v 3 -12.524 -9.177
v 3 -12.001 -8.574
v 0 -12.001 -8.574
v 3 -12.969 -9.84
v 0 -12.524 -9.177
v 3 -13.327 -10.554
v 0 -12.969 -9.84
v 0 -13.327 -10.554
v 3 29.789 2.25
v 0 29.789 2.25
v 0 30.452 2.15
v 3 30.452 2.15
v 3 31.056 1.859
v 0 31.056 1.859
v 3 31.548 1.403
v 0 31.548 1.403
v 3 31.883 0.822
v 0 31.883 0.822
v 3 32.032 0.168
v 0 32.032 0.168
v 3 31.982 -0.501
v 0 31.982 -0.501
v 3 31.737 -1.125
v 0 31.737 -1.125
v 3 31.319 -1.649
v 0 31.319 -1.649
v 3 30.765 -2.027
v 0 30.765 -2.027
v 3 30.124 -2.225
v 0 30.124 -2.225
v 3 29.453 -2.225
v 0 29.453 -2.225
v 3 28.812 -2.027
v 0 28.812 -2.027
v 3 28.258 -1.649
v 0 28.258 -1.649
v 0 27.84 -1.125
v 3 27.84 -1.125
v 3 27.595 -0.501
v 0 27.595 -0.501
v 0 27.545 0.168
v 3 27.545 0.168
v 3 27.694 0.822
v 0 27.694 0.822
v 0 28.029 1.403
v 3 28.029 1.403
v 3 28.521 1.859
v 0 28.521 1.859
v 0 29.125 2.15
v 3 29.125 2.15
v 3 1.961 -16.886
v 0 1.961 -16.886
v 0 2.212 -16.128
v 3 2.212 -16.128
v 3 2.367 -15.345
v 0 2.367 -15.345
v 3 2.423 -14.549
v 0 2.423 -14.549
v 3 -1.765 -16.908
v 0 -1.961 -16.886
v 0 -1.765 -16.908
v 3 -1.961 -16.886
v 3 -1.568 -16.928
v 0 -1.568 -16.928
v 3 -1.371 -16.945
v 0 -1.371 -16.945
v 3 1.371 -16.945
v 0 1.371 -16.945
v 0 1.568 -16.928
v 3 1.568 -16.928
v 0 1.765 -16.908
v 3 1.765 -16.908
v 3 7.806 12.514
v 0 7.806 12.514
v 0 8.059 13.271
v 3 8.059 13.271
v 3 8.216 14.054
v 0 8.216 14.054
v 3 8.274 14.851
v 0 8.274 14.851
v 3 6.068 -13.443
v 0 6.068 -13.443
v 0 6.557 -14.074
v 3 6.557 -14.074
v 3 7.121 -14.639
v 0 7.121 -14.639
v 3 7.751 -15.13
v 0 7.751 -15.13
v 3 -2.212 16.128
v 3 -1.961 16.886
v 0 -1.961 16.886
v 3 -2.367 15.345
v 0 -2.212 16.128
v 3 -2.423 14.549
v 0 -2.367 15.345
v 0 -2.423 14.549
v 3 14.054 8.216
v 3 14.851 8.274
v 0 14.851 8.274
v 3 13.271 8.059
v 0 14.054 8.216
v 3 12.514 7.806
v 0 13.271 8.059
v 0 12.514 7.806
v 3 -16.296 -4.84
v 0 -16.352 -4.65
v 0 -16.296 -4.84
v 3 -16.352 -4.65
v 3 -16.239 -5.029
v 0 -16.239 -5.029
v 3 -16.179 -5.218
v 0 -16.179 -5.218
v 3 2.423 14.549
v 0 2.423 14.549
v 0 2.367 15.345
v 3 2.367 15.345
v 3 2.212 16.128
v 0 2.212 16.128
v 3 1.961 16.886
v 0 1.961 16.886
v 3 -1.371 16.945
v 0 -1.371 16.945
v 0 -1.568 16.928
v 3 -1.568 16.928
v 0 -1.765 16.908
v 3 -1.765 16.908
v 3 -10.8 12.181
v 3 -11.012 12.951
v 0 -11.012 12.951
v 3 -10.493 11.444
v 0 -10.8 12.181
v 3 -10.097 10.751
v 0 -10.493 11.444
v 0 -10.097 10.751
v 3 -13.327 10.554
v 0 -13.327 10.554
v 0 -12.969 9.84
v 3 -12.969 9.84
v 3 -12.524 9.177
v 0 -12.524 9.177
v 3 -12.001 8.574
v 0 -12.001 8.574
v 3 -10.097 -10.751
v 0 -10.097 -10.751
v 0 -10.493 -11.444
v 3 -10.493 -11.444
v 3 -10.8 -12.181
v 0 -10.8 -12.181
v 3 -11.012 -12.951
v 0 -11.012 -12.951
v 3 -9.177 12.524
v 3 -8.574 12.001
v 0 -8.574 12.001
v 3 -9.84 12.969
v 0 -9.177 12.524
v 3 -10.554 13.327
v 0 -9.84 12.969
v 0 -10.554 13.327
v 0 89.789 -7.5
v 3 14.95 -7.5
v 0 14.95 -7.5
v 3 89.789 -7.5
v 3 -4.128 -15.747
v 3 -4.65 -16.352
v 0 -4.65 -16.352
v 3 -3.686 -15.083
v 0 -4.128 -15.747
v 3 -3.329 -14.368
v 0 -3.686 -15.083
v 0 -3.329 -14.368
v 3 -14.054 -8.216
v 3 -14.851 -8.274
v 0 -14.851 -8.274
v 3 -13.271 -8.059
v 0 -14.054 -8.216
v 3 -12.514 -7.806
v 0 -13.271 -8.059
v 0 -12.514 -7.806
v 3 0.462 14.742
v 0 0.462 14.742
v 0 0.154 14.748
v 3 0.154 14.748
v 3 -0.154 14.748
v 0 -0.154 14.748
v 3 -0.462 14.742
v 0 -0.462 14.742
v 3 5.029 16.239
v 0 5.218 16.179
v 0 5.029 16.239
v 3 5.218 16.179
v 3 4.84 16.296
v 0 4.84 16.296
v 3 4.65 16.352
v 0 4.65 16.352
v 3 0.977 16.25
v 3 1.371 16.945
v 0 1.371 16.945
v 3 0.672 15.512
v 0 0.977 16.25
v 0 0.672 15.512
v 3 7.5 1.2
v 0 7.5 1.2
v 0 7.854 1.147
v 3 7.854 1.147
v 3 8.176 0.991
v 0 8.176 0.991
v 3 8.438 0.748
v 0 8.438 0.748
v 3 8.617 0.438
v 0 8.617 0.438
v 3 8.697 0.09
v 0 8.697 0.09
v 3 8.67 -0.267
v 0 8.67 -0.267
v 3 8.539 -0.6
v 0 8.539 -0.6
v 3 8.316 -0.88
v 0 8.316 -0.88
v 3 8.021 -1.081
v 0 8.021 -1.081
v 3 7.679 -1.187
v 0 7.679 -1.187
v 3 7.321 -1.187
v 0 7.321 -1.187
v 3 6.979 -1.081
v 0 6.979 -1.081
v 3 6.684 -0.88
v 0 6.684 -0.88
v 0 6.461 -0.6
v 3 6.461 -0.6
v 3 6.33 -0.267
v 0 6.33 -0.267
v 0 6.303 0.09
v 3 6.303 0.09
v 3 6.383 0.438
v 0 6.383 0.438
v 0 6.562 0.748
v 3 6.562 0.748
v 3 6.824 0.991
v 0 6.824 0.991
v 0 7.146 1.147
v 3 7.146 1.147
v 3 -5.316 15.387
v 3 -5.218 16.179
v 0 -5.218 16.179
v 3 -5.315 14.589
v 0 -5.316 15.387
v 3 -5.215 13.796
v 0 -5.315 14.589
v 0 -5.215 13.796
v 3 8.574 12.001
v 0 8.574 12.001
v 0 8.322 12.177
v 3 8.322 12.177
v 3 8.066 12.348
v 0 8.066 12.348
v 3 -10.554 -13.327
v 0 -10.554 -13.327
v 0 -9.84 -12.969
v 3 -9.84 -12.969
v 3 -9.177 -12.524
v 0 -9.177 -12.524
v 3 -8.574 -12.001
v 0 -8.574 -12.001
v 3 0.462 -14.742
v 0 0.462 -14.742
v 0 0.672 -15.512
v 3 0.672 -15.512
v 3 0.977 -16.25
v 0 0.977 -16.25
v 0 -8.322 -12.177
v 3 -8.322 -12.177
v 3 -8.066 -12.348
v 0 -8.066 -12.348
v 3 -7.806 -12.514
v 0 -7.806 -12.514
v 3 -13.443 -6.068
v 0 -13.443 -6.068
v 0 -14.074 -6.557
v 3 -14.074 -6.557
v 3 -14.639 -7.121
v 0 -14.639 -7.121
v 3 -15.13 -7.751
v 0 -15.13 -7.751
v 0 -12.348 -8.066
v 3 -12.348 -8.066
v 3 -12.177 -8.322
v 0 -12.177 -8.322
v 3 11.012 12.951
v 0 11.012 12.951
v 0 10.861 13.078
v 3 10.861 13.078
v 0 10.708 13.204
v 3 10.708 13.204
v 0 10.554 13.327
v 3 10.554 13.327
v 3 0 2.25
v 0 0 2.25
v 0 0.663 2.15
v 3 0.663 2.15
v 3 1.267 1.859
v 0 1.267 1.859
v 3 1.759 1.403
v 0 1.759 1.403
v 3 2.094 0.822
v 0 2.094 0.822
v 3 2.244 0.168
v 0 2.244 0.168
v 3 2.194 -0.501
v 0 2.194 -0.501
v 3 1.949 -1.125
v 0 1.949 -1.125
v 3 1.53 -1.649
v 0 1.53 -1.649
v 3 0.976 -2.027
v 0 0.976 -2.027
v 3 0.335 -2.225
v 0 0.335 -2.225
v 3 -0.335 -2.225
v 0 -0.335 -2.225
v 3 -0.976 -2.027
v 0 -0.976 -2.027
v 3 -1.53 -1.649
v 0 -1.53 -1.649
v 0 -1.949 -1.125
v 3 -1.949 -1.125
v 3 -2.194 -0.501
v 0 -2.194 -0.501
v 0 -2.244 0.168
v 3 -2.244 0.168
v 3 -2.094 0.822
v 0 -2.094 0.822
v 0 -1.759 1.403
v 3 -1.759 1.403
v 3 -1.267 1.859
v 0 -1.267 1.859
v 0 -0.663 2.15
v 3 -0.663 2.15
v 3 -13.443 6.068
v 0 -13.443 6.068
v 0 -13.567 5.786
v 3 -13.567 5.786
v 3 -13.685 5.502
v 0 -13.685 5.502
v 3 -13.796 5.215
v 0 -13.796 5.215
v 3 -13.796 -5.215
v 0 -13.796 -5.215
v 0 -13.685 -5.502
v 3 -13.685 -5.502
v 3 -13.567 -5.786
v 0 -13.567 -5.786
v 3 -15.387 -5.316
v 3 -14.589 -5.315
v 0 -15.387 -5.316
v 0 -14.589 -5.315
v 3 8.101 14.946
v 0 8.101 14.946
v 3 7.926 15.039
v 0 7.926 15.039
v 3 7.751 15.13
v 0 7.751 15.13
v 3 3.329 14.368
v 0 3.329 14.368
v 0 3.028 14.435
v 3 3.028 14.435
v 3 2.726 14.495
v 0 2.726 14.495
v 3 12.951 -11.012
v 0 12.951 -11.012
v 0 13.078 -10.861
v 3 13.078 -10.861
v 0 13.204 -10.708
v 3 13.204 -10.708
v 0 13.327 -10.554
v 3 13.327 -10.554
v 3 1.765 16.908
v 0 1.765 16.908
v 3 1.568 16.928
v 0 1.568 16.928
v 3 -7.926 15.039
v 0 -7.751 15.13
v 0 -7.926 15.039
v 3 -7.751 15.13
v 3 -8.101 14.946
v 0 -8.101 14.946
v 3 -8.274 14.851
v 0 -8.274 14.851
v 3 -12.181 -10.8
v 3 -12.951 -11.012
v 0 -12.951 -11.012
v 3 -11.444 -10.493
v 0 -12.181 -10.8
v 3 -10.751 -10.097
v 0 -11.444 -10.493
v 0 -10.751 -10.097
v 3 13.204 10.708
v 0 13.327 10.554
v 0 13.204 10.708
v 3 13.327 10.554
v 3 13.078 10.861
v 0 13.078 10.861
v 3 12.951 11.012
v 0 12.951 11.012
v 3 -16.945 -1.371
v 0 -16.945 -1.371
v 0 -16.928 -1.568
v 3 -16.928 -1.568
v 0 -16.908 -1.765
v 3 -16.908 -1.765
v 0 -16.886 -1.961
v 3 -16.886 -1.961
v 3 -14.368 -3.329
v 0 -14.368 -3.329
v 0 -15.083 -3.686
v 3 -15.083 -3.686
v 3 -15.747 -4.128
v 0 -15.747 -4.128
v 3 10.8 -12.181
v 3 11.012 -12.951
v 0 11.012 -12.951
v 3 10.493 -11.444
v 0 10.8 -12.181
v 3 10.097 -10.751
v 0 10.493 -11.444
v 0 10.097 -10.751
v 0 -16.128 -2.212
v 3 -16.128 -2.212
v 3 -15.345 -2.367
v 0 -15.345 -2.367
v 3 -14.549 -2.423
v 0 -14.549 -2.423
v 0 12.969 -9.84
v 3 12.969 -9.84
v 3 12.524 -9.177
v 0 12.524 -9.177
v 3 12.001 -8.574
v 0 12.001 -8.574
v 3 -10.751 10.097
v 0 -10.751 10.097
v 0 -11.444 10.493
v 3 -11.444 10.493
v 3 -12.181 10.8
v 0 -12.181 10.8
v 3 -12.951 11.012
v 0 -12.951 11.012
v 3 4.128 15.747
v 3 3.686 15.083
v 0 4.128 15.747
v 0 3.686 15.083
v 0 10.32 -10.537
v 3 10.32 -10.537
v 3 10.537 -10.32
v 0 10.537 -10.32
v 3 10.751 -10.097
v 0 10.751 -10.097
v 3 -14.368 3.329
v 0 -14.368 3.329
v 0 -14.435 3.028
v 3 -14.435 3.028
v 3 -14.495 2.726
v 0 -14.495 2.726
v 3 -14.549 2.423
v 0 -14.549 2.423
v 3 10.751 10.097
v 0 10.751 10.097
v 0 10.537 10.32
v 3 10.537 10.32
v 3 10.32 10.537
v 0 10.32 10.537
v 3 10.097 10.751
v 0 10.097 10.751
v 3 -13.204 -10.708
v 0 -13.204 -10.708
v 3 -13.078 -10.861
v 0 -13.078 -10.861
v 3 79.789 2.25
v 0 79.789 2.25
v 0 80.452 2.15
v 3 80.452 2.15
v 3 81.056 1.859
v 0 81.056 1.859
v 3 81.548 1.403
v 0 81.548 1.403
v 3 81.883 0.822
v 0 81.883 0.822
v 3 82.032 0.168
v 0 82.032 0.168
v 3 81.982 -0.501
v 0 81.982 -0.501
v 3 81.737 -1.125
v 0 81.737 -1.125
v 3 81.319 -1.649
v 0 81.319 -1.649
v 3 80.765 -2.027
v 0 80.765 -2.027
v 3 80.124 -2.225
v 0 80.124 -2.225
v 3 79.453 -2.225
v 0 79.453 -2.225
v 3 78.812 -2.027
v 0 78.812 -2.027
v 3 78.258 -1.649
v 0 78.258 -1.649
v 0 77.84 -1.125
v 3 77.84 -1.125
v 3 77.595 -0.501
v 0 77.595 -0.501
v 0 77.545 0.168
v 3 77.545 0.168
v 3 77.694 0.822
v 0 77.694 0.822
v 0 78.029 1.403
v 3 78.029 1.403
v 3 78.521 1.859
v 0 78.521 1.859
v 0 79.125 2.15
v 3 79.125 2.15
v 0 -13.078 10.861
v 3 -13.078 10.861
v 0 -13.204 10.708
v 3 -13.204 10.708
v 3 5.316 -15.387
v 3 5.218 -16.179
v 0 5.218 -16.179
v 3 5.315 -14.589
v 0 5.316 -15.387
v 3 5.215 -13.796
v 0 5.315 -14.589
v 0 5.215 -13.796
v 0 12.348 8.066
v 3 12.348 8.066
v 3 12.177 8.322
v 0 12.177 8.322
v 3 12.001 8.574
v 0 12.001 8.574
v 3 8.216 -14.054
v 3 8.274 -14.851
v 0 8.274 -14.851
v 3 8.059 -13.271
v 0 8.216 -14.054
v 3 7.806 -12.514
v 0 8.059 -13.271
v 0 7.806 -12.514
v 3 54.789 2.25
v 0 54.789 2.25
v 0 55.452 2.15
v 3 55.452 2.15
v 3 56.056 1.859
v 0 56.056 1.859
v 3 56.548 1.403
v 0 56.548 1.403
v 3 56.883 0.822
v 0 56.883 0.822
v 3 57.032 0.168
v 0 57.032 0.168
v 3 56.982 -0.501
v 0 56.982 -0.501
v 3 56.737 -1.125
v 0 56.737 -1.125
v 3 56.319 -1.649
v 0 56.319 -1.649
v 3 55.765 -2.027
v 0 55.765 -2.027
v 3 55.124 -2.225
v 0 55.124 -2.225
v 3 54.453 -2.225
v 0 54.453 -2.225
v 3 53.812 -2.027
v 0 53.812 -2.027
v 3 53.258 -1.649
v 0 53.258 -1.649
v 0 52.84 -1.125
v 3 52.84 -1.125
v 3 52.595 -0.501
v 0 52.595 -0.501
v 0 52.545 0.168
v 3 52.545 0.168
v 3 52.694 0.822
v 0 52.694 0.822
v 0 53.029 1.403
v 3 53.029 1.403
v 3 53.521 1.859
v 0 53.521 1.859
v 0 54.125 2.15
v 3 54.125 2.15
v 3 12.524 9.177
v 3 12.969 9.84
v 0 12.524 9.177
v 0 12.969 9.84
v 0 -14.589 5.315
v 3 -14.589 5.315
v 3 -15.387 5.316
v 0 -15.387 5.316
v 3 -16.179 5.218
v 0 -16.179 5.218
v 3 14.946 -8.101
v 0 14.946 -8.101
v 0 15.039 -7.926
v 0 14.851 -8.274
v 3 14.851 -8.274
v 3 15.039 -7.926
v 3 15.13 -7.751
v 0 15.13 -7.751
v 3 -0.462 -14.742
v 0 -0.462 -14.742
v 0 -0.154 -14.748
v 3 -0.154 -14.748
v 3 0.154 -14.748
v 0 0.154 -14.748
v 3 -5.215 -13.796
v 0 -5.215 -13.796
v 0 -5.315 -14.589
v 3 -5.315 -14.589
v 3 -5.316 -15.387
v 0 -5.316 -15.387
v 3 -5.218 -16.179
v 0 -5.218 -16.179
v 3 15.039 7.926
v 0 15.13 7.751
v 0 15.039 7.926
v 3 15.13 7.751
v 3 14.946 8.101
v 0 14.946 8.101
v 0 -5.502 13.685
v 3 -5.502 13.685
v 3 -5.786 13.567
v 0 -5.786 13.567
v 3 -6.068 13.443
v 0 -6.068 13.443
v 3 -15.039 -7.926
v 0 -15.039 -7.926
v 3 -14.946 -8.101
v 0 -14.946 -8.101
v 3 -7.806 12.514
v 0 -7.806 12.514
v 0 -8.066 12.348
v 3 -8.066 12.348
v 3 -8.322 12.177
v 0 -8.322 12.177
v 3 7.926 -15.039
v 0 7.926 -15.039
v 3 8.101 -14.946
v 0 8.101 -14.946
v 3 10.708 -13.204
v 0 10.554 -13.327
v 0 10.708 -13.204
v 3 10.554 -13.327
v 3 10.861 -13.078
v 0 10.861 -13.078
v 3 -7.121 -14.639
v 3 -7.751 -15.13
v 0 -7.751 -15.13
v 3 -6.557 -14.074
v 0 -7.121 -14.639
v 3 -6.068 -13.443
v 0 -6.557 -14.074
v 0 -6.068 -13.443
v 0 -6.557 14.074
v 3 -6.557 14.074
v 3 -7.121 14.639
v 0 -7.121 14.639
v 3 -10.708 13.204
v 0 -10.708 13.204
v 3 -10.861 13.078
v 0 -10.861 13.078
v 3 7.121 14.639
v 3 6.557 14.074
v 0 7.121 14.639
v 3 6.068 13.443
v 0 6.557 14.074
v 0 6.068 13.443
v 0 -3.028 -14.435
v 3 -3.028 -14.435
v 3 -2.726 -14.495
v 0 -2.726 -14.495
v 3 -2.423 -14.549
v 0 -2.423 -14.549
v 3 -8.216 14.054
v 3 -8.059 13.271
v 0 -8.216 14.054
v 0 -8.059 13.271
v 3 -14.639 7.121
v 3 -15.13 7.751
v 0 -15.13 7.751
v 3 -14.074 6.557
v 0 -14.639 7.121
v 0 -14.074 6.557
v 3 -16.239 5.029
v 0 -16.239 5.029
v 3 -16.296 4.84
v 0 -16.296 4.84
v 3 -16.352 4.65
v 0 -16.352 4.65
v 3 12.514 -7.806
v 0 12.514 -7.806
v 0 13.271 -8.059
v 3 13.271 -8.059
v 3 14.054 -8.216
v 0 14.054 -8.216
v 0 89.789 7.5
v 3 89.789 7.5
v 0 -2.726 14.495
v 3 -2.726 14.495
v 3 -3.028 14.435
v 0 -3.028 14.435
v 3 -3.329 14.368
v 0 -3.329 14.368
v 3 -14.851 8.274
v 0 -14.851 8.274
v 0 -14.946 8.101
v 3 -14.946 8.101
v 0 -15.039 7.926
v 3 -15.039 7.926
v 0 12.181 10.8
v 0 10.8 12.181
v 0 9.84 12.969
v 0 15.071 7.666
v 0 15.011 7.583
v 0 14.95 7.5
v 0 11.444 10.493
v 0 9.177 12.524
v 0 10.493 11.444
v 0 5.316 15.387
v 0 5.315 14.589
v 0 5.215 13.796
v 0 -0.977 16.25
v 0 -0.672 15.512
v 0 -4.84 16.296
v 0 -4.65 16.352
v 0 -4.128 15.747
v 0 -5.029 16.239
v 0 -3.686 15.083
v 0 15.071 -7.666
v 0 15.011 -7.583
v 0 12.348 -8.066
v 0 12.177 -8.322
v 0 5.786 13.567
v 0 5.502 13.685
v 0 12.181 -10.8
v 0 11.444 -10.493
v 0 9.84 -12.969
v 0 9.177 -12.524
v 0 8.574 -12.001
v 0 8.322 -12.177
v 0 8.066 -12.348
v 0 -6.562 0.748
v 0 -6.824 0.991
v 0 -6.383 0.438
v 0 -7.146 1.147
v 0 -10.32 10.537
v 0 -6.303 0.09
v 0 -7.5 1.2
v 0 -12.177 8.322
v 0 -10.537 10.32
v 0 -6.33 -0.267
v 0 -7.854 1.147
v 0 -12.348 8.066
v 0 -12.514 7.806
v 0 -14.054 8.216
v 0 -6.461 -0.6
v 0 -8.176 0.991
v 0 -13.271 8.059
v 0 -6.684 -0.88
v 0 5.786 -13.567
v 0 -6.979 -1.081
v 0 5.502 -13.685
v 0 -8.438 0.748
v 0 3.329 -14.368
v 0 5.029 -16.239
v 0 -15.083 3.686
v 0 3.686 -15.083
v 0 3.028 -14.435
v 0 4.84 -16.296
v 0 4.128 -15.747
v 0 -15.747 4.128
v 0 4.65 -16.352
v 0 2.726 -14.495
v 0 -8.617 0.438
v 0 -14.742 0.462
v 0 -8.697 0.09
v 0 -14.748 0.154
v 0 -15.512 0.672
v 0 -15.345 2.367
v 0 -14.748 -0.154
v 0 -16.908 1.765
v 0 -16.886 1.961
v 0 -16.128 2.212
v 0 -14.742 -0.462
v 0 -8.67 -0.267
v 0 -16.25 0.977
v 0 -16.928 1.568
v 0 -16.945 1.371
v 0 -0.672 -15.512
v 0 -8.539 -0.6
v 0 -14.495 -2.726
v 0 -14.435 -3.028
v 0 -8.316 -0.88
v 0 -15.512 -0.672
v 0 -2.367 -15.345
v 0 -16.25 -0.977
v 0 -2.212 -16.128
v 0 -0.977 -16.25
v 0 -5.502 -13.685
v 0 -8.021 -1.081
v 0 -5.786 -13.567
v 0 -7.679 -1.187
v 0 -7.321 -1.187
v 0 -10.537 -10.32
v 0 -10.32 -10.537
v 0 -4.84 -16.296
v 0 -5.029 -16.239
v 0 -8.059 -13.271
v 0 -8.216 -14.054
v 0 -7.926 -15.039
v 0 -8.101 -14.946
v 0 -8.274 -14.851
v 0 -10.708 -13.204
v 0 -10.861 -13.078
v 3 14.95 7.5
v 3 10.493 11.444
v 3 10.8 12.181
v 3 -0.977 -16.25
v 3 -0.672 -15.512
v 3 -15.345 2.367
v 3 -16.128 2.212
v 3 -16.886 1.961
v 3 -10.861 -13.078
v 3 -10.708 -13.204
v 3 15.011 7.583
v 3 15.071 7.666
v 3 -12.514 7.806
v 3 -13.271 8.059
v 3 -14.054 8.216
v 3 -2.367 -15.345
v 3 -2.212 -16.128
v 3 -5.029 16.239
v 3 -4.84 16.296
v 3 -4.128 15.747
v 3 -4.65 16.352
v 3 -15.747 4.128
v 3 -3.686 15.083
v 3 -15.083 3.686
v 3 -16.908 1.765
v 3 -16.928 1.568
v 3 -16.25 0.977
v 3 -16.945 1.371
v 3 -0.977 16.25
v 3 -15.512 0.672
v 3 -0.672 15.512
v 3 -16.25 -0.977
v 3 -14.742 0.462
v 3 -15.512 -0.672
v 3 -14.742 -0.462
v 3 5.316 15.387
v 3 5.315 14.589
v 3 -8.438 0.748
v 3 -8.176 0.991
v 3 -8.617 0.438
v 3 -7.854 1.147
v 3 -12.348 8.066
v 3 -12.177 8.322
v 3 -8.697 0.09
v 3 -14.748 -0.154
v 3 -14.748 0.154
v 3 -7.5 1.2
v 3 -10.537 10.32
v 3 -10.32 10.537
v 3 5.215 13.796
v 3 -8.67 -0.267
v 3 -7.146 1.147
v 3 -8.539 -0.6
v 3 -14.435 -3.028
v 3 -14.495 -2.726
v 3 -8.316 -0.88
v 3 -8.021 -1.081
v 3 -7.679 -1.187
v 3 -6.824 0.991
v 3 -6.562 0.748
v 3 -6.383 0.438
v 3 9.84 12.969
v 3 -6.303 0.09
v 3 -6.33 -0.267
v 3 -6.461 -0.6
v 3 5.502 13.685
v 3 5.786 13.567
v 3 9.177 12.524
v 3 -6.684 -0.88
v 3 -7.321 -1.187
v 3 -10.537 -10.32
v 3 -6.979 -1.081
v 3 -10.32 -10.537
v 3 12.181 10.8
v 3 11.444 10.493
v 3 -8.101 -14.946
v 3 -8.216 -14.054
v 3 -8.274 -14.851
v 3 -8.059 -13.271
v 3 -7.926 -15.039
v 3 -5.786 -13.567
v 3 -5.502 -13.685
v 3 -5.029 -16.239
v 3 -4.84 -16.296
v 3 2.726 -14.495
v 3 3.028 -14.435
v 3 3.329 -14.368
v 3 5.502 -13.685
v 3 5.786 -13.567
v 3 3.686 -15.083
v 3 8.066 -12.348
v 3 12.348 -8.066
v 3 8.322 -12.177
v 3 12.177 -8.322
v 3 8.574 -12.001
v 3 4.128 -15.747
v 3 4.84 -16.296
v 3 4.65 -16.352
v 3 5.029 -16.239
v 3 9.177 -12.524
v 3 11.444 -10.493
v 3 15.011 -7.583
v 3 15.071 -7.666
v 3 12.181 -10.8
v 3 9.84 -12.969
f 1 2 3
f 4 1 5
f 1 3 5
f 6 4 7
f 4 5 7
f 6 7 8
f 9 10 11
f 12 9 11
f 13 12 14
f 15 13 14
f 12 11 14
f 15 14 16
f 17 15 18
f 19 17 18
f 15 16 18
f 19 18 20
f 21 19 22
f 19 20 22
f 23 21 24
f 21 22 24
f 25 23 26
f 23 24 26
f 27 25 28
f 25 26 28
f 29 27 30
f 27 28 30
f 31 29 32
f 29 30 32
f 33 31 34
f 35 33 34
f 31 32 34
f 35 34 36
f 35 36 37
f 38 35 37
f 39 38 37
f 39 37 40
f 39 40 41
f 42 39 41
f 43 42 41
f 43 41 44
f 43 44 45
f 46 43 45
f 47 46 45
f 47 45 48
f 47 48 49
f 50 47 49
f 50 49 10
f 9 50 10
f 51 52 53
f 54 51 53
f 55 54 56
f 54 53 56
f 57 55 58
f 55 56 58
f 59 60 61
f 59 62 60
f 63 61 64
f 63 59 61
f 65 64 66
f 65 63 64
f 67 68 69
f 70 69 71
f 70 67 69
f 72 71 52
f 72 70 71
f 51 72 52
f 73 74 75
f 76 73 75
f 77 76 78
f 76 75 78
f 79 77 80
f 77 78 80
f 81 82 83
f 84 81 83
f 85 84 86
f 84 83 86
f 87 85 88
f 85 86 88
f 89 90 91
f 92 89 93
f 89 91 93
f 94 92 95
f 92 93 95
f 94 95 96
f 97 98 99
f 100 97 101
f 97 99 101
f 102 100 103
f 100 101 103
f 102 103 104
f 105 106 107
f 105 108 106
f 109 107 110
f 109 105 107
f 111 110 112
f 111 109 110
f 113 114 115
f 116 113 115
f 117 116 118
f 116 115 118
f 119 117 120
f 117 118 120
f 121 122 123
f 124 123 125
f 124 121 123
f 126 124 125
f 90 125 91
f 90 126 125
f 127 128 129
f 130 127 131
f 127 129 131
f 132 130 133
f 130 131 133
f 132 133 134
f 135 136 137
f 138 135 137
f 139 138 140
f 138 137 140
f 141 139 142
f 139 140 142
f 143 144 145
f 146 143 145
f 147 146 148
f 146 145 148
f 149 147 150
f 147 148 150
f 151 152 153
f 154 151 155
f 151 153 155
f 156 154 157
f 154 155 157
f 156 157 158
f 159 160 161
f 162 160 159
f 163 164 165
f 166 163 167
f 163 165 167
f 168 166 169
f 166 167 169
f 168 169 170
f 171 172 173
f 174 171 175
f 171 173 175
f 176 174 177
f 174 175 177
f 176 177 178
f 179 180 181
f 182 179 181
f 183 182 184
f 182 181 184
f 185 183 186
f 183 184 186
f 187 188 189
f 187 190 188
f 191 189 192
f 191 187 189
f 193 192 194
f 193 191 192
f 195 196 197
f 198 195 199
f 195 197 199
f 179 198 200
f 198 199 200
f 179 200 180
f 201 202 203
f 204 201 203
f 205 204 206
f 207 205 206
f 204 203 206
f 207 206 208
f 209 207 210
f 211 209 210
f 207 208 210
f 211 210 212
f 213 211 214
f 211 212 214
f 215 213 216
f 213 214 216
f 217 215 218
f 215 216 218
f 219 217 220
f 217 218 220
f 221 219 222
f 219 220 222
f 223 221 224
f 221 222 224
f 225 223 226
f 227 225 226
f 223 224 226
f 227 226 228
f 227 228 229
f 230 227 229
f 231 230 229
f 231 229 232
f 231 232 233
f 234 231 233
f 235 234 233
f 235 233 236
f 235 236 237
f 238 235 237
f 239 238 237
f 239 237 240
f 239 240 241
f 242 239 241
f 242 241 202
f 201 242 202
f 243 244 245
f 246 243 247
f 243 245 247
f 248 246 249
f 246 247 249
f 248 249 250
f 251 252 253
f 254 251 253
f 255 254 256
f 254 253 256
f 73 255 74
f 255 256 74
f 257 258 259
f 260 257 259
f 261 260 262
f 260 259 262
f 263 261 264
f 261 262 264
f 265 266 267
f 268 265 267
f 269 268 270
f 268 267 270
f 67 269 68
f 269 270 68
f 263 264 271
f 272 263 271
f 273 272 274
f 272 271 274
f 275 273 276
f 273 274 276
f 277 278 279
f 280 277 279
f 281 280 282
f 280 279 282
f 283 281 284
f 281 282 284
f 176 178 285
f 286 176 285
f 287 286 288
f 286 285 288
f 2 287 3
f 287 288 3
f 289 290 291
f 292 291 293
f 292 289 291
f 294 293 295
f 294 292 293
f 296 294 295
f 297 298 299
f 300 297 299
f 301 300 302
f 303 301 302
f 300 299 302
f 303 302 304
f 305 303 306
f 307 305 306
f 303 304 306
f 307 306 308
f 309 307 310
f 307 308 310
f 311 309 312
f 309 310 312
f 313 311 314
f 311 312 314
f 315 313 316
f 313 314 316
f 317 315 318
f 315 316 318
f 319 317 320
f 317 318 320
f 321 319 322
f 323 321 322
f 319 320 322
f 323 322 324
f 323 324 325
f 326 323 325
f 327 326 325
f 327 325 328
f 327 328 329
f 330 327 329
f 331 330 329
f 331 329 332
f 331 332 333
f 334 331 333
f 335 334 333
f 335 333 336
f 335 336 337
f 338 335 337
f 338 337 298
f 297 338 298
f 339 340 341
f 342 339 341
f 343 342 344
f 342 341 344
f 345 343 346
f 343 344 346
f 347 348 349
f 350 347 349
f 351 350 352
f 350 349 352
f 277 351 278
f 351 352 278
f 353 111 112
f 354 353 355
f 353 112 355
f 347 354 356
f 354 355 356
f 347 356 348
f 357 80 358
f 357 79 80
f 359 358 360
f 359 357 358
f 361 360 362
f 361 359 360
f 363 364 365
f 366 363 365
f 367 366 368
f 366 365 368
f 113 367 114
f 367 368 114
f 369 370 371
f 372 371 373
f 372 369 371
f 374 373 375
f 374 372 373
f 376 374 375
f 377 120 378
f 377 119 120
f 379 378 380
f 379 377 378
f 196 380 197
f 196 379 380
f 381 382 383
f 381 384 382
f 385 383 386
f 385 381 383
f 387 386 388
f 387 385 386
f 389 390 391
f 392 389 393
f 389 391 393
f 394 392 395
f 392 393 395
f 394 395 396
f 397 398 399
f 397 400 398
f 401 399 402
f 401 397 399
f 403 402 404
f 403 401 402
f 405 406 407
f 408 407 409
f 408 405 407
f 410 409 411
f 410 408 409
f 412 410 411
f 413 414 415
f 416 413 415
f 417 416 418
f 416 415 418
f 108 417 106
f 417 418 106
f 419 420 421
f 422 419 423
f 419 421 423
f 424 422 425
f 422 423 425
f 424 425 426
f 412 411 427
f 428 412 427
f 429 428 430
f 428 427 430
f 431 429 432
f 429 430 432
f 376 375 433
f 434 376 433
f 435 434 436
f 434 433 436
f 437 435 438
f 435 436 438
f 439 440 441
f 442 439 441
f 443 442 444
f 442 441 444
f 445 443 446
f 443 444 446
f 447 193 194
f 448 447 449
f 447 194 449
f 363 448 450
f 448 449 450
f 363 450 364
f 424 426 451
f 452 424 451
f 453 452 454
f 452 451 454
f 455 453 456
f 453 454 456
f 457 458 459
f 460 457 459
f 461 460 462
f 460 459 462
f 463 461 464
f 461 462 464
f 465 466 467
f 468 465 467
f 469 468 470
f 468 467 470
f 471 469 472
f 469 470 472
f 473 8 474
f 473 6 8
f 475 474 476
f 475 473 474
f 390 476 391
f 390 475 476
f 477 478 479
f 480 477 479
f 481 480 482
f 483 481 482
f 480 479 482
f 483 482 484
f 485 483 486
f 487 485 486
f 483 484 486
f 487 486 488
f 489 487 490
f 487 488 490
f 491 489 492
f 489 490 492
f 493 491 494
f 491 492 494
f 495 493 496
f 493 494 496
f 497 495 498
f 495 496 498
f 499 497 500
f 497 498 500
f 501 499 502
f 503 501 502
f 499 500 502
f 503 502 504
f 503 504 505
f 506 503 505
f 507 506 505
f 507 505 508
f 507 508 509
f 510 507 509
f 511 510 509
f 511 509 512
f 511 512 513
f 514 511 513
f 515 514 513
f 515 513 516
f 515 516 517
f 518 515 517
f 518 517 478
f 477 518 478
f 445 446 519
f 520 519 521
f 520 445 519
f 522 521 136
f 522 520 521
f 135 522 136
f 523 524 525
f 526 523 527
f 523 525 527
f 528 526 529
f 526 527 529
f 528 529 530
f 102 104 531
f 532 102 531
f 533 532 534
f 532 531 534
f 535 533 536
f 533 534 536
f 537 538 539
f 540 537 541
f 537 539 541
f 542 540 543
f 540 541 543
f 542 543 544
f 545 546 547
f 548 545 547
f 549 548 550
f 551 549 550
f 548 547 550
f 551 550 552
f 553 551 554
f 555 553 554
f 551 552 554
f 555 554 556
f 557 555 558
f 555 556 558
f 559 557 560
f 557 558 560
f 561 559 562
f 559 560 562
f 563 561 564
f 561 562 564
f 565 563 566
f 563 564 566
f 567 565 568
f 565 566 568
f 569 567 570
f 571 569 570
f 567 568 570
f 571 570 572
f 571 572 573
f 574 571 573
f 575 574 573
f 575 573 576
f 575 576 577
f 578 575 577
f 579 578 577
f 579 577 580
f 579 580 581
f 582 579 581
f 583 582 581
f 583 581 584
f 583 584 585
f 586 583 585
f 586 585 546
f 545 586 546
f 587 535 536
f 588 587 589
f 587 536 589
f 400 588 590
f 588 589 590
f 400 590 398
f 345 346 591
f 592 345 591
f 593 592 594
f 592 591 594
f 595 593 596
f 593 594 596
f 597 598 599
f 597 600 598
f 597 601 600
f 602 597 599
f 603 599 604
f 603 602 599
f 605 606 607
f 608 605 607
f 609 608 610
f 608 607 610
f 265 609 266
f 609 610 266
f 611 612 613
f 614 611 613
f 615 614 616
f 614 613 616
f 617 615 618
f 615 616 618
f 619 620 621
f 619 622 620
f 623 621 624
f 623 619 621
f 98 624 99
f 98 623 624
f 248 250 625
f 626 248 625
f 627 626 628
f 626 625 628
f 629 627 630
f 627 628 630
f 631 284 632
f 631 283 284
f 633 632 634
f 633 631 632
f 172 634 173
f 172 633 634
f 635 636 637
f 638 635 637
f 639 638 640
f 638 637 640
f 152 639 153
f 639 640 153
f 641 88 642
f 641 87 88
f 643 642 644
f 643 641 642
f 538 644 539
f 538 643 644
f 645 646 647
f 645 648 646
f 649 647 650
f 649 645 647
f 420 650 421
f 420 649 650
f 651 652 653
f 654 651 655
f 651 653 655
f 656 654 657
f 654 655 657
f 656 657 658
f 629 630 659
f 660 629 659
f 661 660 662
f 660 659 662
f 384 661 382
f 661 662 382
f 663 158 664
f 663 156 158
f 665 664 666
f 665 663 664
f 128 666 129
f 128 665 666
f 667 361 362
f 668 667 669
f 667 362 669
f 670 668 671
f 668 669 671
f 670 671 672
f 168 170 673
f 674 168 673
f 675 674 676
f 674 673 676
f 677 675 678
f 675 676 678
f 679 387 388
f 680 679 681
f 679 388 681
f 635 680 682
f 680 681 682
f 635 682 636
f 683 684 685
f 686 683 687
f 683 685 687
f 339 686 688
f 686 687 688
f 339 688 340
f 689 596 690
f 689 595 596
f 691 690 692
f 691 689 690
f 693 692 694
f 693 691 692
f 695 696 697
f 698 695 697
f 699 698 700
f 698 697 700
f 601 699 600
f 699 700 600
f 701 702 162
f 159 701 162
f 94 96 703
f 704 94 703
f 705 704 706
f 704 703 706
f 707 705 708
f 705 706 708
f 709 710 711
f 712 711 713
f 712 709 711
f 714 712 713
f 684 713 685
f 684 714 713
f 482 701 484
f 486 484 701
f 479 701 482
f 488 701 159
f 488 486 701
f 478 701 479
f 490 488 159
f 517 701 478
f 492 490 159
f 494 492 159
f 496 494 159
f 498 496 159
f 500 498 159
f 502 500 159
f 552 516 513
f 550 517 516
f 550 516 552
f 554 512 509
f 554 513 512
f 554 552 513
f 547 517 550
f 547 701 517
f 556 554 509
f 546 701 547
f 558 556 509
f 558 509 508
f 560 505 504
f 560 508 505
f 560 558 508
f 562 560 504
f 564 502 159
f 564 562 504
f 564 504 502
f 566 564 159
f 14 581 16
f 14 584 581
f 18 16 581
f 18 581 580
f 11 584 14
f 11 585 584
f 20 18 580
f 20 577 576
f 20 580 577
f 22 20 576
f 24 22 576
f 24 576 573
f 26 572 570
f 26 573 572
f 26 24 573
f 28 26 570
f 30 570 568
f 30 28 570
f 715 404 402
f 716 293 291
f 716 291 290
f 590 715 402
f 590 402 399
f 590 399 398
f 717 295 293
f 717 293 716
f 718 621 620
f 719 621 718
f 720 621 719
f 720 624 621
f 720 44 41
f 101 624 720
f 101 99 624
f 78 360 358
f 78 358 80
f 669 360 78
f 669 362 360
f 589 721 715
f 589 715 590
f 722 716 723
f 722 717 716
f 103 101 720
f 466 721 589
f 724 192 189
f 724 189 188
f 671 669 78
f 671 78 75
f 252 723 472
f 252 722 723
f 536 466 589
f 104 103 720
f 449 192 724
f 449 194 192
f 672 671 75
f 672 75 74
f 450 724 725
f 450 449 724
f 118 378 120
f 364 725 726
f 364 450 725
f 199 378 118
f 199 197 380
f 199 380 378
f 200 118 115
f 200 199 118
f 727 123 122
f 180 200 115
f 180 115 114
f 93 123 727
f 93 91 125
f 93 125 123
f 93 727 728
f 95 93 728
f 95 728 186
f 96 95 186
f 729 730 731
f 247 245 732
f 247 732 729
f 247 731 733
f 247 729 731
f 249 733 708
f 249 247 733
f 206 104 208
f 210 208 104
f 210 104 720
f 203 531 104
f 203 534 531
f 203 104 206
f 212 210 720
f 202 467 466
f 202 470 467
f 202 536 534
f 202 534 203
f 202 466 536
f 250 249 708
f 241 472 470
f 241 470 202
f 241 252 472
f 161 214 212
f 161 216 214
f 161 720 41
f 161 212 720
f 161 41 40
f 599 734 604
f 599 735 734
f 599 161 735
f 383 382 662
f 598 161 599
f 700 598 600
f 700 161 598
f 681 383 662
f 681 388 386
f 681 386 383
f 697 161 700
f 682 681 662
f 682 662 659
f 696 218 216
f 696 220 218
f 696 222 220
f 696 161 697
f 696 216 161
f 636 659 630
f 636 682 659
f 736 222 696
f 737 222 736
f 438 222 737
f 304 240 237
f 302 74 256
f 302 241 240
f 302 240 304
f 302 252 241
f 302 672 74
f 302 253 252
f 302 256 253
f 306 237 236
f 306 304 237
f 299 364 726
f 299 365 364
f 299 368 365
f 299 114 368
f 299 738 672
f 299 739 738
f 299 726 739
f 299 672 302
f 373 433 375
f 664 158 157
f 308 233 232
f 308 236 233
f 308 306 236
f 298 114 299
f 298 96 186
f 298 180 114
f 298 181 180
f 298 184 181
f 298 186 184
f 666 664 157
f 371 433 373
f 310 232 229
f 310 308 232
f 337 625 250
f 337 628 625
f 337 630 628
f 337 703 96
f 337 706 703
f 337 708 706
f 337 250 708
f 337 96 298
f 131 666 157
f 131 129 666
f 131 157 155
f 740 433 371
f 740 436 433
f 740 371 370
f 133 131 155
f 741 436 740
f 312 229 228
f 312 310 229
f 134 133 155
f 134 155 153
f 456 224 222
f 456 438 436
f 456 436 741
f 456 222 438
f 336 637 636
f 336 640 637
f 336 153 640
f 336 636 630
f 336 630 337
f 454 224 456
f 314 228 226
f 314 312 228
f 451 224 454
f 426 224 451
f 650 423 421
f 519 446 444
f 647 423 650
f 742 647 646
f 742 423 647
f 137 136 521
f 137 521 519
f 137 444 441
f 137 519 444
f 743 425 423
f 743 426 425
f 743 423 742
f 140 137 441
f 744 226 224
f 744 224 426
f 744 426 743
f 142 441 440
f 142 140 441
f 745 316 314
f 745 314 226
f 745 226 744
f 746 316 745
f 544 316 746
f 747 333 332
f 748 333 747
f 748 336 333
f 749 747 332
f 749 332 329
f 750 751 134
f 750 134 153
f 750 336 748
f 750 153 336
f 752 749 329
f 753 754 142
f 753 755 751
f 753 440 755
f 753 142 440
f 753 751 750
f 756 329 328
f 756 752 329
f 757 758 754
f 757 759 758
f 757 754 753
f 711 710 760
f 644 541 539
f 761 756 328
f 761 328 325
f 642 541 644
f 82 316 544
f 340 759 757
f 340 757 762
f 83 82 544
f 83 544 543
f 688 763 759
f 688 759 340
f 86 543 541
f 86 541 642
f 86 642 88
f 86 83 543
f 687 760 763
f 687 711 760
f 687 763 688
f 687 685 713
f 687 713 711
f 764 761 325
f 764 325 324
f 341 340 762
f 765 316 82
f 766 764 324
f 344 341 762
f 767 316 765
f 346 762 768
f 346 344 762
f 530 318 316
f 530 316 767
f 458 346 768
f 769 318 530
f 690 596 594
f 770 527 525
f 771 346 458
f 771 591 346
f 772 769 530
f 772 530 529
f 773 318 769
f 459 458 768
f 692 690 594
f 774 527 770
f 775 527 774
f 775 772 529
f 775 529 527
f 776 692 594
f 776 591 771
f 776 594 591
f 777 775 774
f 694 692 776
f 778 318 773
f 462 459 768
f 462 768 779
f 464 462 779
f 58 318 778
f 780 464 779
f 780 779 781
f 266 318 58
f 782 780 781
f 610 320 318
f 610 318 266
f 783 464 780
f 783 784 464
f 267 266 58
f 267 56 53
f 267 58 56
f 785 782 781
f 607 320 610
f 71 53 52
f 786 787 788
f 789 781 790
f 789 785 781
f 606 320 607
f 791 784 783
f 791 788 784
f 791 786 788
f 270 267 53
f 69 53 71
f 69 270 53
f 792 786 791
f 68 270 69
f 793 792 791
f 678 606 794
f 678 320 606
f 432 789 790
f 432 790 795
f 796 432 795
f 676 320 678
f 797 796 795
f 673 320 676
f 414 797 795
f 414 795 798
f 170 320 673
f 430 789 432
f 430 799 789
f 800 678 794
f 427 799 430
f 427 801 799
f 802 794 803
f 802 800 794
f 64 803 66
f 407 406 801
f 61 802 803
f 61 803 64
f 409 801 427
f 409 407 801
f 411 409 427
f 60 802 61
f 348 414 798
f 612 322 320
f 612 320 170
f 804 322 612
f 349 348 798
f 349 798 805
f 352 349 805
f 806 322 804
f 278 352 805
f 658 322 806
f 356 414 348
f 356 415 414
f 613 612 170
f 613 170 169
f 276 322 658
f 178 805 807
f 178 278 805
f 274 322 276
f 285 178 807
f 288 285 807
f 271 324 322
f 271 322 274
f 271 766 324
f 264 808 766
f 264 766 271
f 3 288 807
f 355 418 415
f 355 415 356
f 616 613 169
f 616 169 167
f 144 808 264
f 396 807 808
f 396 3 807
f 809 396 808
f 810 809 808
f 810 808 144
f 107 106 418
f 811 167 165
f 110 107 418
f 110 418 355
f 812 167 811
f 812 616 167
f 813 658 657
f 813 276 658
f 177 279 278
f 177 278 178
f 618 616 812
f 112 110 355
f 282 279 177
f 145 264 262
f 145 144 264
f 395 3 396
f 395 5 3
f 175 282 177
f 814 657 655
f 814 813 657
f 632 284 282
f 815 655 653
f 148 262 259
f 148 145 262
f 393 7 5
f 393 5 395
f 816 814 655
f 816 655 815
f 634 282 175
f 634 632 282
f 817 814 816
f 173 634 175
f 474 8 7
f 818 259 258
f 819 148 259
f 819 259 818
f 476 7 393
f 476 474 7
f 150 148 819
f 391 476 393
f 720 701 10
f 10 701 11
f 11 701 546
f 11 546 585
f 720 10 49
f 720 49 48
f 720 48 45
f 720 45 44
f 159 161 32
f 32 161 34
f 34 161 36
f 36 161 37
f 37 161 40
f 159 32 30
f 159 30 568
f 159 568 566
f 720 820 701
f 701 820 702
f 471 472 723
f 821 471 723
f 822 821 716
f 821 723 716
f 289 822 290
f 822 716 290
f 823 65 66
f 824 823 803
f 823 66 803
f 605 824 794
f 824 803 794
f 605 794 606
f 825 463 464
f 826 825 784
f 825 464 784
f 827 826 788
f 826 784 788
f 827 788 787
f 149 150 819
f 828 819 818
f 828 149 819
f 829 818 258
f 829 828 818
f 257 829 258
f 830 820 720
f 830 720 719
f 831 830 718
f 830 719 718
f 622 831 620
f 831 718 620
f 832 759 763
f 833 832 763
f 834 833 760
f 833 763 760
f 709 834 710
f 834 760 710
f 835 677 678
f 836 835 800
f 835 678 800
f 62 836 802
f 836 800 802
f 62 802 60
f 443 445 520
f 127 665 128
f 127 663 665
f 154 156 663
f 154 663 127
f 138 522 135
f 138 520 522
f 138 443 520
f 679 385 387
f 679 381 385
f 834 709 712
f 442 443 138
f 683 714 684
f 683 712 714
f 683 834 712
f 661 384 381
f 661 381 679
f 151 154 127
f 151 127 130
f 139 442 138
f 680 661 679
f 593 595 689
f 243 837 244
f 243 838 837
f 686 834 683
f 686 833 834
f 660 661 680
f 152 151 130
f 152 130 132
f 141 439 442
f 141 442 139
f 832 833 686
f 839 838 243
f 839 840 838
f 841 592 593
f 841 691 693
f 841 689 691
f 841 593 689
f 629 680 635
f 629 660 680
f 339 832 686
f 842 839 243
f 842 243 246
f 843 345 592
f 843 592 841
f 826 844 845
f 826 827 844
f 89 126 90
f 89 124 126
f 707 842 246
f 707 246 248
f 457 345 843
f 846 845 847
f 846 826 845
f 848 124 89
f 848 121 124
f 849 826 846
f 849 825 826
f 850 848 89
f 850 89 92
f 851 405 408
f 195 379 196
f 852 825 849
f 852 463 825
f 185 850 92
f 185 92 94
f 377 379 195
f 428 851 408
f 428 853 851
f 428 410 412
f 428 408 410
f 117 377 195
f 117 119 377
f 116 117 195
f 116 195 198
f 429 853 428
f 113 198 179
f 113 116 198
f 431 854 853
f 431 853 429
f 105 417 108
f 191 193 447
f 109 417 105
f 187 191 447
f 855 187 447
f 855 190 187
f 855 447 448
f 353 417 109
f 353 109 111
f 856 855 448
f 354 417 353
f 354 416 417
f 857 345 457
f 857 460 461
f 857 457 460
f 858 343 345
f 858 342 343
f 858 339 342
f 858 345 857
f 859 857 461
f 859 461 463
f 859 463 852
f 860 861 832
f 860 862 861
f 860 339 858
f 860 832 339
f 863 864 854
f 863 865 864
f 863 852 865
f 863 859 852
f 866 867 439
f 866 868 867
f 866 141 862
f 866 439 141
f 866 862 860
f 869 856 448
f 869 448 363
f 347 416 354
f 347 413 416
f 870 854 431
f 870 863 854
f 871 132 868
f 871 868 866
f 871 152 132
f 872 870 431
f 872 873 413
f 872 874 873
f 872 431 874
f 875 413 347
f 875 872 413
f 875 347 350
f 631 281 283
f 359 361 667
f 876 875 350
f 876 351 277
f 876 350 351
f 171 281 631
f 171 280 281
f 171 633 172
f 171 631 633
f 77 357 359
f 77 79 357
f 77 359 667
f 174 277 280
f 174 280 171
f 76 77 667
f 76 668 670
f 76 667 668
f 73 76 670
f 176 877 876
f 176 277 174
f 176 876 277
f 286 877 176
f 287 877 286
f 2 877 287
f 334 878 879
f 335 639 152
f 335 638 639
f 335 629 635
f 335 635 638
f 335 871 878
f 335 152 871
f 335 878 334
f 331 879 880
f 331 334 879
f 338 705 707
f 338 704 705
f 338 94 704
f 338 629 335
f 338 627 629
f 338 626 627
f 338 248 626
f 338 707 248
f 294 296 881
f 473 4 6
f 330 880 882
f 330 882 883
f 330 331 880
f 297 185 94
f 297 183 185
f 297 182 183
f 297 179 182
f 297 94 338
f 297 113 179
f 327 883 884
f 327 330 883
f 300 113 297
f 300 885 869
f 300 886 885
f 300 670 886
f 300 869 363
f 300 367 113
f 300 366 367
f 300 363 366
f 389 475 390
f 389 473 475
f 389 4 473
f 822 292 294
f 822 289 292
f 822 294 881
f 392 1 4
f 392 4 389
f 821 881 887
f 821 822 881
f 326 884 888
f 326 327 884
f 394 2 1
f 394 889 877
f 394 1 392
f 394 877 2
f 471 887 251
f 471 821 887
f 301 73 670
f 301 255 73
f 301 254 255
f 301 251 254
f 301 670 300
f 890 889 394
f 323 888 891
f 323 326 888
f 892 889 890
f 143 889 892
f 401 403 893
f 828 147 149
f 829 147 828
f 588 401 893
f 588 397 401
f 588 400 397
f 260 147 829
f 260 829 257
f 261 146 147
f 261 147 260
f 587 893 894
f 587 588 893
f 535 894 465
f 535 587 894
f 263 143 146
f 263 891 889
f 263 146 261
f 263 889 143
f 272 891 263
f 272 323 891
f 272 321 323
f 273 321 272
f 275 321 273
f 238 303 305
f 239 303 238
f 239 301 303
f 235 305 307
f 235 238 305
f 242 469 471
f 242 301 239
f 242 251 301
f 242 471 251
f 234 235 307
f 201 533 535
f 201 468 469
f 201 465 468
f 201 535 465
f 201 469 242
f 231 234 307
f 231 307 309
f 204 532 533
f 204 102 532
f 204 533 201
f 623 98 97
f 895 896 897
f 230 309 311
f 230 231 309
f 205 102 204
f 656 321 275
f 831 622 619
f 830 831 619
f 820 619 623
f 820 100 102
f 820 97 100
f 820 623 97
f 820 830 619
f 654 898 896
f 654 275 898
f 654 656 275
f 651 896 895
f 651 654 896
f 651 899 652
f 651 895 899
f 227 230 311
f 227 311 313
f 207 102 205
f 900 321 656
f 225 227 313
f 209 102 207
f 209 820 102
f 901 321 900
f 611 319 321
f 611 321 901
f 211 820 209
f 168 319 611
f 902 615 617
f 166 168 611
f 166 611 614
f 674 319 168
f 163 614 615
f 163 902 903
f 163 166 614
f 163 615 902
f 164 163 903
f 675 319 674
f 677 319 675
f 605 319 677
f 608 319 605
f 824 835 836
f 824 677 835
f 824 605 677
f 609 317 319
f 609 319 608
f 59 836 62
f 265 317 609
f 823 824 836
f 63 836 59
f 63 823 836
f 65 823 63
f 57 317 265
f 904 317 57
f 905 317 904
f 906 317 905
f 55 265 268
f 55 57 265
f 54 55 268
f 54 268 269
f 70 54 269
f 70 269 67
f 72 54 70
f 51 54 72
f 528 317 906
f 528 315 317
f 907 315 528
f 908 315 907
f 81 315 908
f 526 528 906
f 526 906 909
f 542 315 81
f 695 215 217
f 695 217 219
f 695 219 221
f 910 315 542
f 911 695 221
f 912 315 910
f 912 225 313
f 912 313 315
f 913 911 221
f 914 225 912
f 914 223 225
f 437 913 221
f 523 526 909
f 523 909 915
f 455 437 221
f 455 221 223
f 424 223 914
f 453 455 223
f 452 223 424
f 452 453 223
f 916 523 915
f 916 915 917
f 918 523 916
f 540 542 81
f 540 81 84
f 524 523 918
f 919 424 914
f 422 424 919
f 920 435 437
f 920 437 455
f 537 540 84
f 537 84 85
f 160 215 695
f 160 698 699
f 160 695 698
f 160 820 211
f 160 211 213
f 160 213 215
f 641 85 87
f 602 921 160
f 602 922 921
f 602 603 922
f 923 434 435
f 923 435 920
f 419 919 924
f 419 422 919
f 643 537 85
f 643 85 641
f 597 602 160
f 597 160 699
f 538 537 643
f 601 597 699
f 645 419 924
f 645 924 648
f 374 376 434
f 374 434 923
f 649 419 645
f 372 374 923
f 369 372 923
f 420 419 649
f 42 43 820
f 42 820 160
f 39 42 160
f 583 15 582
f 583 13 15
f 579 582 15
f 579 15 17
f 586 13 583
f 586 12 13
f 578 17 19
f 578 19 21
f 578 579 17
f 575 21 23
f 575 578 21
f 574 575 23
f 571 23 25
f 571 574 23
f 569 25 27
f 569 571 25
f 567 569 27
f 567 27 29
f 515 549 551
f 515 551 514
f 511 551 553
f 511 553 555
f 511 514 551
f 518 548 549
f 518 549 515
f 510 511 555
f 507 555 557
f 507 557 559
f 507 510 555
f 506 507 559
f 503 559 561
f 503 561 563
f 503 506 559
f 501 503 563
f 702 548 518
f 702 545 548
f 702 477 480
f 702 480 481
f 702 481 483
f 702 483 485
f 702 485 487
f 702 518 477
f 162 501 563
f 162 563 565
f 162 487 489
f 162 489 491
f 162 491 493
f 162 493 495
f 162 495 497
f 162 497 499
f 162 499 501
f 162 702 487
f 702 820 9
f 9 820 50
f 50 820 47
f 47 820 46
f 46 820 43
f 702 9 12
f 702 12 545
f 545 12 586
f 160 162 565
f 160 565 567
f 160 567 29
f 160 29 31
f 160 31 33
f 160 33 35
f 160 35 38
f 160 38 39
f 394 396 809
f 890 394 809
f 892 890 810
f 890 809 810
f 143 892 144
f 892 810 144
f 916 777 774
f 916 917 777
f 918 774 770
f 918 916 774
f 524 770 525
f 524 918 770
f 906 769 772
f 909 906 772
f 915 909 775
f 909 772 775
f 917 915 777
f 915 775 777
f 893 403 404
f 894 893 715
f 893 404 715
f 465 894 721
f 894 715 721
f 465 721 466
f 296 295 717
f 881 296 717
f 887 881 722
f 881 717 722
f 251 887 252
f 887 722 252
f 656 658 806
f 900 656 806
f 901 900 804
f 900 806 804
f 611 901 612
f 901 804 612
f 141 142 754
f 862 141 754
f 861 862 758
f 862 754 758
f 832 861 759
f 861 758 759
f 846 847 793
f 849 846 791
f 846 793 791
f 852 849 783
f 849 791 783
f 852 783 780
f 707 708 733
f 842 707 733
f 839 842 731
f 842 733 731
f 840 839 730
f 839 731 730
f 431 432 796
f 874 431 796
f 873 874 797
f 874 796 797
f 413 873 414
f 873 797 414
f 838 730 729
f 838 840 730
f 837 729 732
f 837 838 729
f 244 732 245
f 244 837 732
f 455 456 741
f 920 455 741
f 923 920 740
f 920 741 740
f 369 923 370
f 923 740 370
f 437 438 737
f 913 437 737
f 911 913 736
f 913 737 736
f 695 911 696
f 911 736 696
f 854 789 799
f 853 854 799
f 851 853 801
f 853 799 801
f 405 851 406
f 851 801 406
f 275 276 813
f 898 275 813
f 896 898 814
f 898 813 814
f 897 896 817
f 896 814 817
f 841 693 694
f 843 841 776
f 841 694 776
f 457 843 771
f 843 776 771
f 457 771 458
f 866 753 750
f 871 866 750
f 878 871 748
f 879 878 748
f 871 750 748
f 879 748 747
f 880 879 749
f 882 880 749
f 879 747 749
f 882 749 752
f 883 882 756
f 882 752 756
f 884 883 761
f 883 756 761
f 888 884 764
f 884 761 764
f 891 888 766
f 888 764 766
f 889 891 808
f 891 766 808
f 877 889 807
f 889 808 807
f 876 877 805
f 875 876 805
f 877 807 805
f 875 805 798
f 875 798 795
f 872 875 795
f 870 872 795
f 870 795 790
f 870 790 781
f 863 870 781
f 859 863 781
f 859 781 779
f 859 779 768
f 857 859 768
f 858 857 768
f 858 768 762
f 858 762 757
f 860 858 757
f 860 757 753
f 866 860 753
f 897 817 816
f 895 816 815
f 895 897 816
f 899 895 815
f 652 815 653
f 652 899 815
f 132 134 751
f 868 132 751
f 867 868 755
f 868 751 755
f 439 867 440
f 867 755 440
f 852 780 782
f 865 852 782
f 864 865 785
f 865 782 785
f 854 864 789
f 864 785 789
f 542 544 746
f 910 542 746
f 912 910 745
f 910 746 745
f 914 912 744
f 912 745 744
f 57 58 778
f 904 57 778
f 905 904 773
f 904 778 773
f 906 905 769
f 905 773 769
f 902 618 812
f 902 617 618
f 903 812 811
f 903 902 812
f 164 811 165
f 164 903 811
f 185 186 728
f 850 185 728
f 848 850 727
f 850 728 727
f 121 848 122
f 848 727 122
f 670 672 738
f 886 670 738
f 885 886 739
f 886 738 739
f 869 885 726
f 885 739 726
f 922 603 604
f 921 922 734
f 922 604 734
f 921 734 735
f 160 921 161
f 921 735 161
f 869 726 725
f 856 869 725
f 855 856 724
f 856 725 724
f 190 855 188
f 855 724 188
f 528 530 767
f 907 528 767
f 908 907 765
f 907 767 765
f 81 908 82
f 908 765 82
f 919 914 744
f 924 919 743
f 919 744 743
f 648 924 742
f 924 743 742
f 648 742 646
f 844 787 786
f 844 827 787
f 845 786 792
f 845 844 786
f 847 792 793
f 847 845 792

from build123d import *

# Parameters (mm, degrees)
BASPROSKE_W          = 3
BASPROSKE_H          = 17
TOOTHCUT_DEPTH       = 25.228082879
TEETHCUTS_COUNT      = 32
TEETHCUTS_ANGLE      = 348.75
BORSKE_R             = 2
BORE_DEPTH           = 50.0000508
SKETCH1_W            = 15
SKETCH1_H            = 80
BOSS_EXTRUDE1_DEPTH  = 3
M4_CLEARANCE_HOLE1_D = 4.5
M2_CLEARANCE_HOLE1_D = 2.4


with BuildPart() as part:
    # BasProSke → Base-Revolve (revolve)
    with BuildSketch(Plane(origin=(0, 0, 0), x_dir=(1, 0, 0), z_dir=(0, 1, 0)), mode=Mode.PRIVATE) as base_revolve_sk:
        with Locations((1.5, 8.5)):
            Rectangle(BASPROSKE_W, BASPROSKE_H)
    revolve(base_revolve_sk.sketch.rotate(Axis((-10, 0, 0), (1, 0, 0)), 180), axis=Axis((-10, 0, 0), (1, 0, 0)))

    # TooCutSke → ToothCut (cut, through all)
    with BuildSketch(Plane(origin=(0, 0, 0), x_dir=(0, 0, -1), z_dir=(1, 0, 0))):
        with BuildLine():
            ThreePointArc((0.462036907, 14.741761187), (0, 14.749), (-0.462036907, 14.741761187))
            ThreePointArc((-0.462036907, 14.741761187), (-0.81854142, 15.899240468), (-1.386721275, 16.9688317))
            ThreePointArc((-1.386721275, 16.9688317), (0, 17.0254), (1.386721275, 16.9688317))
            ThreePointArc((1.386721275, 16.9688317), (0.81854142, 15.899240468), (0.462036907, 14.741761187))
        make_face()
    toothcut = extrude(amount=TOOTHCUT_DEPTH, mode=Mode.SUBTRACT)

    # TeethCuts: ToothCut ×32 about axis
    teethcuts_axis = Axis((-10, 0, 0), (1, 0, 0))
    for i in range(1, TEETHCUTS_COUNT):
        add(toothcut.rotate(teethcuts_axis, i * TEETHCUTS_ANGLE / (TEETHCUTS_COUNT - 1)), mode=Mode.SUBTRACT)

    # BorSke → Bore (cut, symmetric)
    with BuildSketch(Plane(origin=(0, 0, 0), x_dir=(0, 0, -1), z_dir=(1, 0, 0))):
        with Locations(Location((0, 0, 0), (0, 0, 180))):
            Circle(BORSKE_R)
    extrude(amount=BORE_DEPTH, both=True, mode=Mode.SUBTRACT)

    # Sketch1 → Boss-Extrude1 (add)
    with BuildSketch(Plane(origin=(3, 0, 0), x_dir=(0, 0, -1), z_dir=(1, 0, 0))):
        with Locations((0, 49.788617333)):
            Rectangle(SKETCH1_W, SKETCH1_H)
    extrude(amount=-BOSS_EXTRUDE1_DEPTH)

    # M4 Clearance Hole1 (through all)
    with Locations(Plane(origin=(3, 0, 0), x_dir=(0, 0, -1), z_dir=(1, 0, 0))):
        with Locations((0, 79.788617333), (0, 29.788617333), (0, 54.788617333), (0, 0)):
            Hole(M4_CLEARANCE_HOLE1_D / 2)

    # M2 Clearance Hole1 (through all)
    with Locations(Plane(origin=(3, 0, 0), x_dir=(0, 0, -1), z_dir=(1, 0, 0))):
        with Locations((0, 7.5), (0, -7.5)):
            Hole(M2_CLEARANCE_HOLE1_D / 2)


solid = part.part
